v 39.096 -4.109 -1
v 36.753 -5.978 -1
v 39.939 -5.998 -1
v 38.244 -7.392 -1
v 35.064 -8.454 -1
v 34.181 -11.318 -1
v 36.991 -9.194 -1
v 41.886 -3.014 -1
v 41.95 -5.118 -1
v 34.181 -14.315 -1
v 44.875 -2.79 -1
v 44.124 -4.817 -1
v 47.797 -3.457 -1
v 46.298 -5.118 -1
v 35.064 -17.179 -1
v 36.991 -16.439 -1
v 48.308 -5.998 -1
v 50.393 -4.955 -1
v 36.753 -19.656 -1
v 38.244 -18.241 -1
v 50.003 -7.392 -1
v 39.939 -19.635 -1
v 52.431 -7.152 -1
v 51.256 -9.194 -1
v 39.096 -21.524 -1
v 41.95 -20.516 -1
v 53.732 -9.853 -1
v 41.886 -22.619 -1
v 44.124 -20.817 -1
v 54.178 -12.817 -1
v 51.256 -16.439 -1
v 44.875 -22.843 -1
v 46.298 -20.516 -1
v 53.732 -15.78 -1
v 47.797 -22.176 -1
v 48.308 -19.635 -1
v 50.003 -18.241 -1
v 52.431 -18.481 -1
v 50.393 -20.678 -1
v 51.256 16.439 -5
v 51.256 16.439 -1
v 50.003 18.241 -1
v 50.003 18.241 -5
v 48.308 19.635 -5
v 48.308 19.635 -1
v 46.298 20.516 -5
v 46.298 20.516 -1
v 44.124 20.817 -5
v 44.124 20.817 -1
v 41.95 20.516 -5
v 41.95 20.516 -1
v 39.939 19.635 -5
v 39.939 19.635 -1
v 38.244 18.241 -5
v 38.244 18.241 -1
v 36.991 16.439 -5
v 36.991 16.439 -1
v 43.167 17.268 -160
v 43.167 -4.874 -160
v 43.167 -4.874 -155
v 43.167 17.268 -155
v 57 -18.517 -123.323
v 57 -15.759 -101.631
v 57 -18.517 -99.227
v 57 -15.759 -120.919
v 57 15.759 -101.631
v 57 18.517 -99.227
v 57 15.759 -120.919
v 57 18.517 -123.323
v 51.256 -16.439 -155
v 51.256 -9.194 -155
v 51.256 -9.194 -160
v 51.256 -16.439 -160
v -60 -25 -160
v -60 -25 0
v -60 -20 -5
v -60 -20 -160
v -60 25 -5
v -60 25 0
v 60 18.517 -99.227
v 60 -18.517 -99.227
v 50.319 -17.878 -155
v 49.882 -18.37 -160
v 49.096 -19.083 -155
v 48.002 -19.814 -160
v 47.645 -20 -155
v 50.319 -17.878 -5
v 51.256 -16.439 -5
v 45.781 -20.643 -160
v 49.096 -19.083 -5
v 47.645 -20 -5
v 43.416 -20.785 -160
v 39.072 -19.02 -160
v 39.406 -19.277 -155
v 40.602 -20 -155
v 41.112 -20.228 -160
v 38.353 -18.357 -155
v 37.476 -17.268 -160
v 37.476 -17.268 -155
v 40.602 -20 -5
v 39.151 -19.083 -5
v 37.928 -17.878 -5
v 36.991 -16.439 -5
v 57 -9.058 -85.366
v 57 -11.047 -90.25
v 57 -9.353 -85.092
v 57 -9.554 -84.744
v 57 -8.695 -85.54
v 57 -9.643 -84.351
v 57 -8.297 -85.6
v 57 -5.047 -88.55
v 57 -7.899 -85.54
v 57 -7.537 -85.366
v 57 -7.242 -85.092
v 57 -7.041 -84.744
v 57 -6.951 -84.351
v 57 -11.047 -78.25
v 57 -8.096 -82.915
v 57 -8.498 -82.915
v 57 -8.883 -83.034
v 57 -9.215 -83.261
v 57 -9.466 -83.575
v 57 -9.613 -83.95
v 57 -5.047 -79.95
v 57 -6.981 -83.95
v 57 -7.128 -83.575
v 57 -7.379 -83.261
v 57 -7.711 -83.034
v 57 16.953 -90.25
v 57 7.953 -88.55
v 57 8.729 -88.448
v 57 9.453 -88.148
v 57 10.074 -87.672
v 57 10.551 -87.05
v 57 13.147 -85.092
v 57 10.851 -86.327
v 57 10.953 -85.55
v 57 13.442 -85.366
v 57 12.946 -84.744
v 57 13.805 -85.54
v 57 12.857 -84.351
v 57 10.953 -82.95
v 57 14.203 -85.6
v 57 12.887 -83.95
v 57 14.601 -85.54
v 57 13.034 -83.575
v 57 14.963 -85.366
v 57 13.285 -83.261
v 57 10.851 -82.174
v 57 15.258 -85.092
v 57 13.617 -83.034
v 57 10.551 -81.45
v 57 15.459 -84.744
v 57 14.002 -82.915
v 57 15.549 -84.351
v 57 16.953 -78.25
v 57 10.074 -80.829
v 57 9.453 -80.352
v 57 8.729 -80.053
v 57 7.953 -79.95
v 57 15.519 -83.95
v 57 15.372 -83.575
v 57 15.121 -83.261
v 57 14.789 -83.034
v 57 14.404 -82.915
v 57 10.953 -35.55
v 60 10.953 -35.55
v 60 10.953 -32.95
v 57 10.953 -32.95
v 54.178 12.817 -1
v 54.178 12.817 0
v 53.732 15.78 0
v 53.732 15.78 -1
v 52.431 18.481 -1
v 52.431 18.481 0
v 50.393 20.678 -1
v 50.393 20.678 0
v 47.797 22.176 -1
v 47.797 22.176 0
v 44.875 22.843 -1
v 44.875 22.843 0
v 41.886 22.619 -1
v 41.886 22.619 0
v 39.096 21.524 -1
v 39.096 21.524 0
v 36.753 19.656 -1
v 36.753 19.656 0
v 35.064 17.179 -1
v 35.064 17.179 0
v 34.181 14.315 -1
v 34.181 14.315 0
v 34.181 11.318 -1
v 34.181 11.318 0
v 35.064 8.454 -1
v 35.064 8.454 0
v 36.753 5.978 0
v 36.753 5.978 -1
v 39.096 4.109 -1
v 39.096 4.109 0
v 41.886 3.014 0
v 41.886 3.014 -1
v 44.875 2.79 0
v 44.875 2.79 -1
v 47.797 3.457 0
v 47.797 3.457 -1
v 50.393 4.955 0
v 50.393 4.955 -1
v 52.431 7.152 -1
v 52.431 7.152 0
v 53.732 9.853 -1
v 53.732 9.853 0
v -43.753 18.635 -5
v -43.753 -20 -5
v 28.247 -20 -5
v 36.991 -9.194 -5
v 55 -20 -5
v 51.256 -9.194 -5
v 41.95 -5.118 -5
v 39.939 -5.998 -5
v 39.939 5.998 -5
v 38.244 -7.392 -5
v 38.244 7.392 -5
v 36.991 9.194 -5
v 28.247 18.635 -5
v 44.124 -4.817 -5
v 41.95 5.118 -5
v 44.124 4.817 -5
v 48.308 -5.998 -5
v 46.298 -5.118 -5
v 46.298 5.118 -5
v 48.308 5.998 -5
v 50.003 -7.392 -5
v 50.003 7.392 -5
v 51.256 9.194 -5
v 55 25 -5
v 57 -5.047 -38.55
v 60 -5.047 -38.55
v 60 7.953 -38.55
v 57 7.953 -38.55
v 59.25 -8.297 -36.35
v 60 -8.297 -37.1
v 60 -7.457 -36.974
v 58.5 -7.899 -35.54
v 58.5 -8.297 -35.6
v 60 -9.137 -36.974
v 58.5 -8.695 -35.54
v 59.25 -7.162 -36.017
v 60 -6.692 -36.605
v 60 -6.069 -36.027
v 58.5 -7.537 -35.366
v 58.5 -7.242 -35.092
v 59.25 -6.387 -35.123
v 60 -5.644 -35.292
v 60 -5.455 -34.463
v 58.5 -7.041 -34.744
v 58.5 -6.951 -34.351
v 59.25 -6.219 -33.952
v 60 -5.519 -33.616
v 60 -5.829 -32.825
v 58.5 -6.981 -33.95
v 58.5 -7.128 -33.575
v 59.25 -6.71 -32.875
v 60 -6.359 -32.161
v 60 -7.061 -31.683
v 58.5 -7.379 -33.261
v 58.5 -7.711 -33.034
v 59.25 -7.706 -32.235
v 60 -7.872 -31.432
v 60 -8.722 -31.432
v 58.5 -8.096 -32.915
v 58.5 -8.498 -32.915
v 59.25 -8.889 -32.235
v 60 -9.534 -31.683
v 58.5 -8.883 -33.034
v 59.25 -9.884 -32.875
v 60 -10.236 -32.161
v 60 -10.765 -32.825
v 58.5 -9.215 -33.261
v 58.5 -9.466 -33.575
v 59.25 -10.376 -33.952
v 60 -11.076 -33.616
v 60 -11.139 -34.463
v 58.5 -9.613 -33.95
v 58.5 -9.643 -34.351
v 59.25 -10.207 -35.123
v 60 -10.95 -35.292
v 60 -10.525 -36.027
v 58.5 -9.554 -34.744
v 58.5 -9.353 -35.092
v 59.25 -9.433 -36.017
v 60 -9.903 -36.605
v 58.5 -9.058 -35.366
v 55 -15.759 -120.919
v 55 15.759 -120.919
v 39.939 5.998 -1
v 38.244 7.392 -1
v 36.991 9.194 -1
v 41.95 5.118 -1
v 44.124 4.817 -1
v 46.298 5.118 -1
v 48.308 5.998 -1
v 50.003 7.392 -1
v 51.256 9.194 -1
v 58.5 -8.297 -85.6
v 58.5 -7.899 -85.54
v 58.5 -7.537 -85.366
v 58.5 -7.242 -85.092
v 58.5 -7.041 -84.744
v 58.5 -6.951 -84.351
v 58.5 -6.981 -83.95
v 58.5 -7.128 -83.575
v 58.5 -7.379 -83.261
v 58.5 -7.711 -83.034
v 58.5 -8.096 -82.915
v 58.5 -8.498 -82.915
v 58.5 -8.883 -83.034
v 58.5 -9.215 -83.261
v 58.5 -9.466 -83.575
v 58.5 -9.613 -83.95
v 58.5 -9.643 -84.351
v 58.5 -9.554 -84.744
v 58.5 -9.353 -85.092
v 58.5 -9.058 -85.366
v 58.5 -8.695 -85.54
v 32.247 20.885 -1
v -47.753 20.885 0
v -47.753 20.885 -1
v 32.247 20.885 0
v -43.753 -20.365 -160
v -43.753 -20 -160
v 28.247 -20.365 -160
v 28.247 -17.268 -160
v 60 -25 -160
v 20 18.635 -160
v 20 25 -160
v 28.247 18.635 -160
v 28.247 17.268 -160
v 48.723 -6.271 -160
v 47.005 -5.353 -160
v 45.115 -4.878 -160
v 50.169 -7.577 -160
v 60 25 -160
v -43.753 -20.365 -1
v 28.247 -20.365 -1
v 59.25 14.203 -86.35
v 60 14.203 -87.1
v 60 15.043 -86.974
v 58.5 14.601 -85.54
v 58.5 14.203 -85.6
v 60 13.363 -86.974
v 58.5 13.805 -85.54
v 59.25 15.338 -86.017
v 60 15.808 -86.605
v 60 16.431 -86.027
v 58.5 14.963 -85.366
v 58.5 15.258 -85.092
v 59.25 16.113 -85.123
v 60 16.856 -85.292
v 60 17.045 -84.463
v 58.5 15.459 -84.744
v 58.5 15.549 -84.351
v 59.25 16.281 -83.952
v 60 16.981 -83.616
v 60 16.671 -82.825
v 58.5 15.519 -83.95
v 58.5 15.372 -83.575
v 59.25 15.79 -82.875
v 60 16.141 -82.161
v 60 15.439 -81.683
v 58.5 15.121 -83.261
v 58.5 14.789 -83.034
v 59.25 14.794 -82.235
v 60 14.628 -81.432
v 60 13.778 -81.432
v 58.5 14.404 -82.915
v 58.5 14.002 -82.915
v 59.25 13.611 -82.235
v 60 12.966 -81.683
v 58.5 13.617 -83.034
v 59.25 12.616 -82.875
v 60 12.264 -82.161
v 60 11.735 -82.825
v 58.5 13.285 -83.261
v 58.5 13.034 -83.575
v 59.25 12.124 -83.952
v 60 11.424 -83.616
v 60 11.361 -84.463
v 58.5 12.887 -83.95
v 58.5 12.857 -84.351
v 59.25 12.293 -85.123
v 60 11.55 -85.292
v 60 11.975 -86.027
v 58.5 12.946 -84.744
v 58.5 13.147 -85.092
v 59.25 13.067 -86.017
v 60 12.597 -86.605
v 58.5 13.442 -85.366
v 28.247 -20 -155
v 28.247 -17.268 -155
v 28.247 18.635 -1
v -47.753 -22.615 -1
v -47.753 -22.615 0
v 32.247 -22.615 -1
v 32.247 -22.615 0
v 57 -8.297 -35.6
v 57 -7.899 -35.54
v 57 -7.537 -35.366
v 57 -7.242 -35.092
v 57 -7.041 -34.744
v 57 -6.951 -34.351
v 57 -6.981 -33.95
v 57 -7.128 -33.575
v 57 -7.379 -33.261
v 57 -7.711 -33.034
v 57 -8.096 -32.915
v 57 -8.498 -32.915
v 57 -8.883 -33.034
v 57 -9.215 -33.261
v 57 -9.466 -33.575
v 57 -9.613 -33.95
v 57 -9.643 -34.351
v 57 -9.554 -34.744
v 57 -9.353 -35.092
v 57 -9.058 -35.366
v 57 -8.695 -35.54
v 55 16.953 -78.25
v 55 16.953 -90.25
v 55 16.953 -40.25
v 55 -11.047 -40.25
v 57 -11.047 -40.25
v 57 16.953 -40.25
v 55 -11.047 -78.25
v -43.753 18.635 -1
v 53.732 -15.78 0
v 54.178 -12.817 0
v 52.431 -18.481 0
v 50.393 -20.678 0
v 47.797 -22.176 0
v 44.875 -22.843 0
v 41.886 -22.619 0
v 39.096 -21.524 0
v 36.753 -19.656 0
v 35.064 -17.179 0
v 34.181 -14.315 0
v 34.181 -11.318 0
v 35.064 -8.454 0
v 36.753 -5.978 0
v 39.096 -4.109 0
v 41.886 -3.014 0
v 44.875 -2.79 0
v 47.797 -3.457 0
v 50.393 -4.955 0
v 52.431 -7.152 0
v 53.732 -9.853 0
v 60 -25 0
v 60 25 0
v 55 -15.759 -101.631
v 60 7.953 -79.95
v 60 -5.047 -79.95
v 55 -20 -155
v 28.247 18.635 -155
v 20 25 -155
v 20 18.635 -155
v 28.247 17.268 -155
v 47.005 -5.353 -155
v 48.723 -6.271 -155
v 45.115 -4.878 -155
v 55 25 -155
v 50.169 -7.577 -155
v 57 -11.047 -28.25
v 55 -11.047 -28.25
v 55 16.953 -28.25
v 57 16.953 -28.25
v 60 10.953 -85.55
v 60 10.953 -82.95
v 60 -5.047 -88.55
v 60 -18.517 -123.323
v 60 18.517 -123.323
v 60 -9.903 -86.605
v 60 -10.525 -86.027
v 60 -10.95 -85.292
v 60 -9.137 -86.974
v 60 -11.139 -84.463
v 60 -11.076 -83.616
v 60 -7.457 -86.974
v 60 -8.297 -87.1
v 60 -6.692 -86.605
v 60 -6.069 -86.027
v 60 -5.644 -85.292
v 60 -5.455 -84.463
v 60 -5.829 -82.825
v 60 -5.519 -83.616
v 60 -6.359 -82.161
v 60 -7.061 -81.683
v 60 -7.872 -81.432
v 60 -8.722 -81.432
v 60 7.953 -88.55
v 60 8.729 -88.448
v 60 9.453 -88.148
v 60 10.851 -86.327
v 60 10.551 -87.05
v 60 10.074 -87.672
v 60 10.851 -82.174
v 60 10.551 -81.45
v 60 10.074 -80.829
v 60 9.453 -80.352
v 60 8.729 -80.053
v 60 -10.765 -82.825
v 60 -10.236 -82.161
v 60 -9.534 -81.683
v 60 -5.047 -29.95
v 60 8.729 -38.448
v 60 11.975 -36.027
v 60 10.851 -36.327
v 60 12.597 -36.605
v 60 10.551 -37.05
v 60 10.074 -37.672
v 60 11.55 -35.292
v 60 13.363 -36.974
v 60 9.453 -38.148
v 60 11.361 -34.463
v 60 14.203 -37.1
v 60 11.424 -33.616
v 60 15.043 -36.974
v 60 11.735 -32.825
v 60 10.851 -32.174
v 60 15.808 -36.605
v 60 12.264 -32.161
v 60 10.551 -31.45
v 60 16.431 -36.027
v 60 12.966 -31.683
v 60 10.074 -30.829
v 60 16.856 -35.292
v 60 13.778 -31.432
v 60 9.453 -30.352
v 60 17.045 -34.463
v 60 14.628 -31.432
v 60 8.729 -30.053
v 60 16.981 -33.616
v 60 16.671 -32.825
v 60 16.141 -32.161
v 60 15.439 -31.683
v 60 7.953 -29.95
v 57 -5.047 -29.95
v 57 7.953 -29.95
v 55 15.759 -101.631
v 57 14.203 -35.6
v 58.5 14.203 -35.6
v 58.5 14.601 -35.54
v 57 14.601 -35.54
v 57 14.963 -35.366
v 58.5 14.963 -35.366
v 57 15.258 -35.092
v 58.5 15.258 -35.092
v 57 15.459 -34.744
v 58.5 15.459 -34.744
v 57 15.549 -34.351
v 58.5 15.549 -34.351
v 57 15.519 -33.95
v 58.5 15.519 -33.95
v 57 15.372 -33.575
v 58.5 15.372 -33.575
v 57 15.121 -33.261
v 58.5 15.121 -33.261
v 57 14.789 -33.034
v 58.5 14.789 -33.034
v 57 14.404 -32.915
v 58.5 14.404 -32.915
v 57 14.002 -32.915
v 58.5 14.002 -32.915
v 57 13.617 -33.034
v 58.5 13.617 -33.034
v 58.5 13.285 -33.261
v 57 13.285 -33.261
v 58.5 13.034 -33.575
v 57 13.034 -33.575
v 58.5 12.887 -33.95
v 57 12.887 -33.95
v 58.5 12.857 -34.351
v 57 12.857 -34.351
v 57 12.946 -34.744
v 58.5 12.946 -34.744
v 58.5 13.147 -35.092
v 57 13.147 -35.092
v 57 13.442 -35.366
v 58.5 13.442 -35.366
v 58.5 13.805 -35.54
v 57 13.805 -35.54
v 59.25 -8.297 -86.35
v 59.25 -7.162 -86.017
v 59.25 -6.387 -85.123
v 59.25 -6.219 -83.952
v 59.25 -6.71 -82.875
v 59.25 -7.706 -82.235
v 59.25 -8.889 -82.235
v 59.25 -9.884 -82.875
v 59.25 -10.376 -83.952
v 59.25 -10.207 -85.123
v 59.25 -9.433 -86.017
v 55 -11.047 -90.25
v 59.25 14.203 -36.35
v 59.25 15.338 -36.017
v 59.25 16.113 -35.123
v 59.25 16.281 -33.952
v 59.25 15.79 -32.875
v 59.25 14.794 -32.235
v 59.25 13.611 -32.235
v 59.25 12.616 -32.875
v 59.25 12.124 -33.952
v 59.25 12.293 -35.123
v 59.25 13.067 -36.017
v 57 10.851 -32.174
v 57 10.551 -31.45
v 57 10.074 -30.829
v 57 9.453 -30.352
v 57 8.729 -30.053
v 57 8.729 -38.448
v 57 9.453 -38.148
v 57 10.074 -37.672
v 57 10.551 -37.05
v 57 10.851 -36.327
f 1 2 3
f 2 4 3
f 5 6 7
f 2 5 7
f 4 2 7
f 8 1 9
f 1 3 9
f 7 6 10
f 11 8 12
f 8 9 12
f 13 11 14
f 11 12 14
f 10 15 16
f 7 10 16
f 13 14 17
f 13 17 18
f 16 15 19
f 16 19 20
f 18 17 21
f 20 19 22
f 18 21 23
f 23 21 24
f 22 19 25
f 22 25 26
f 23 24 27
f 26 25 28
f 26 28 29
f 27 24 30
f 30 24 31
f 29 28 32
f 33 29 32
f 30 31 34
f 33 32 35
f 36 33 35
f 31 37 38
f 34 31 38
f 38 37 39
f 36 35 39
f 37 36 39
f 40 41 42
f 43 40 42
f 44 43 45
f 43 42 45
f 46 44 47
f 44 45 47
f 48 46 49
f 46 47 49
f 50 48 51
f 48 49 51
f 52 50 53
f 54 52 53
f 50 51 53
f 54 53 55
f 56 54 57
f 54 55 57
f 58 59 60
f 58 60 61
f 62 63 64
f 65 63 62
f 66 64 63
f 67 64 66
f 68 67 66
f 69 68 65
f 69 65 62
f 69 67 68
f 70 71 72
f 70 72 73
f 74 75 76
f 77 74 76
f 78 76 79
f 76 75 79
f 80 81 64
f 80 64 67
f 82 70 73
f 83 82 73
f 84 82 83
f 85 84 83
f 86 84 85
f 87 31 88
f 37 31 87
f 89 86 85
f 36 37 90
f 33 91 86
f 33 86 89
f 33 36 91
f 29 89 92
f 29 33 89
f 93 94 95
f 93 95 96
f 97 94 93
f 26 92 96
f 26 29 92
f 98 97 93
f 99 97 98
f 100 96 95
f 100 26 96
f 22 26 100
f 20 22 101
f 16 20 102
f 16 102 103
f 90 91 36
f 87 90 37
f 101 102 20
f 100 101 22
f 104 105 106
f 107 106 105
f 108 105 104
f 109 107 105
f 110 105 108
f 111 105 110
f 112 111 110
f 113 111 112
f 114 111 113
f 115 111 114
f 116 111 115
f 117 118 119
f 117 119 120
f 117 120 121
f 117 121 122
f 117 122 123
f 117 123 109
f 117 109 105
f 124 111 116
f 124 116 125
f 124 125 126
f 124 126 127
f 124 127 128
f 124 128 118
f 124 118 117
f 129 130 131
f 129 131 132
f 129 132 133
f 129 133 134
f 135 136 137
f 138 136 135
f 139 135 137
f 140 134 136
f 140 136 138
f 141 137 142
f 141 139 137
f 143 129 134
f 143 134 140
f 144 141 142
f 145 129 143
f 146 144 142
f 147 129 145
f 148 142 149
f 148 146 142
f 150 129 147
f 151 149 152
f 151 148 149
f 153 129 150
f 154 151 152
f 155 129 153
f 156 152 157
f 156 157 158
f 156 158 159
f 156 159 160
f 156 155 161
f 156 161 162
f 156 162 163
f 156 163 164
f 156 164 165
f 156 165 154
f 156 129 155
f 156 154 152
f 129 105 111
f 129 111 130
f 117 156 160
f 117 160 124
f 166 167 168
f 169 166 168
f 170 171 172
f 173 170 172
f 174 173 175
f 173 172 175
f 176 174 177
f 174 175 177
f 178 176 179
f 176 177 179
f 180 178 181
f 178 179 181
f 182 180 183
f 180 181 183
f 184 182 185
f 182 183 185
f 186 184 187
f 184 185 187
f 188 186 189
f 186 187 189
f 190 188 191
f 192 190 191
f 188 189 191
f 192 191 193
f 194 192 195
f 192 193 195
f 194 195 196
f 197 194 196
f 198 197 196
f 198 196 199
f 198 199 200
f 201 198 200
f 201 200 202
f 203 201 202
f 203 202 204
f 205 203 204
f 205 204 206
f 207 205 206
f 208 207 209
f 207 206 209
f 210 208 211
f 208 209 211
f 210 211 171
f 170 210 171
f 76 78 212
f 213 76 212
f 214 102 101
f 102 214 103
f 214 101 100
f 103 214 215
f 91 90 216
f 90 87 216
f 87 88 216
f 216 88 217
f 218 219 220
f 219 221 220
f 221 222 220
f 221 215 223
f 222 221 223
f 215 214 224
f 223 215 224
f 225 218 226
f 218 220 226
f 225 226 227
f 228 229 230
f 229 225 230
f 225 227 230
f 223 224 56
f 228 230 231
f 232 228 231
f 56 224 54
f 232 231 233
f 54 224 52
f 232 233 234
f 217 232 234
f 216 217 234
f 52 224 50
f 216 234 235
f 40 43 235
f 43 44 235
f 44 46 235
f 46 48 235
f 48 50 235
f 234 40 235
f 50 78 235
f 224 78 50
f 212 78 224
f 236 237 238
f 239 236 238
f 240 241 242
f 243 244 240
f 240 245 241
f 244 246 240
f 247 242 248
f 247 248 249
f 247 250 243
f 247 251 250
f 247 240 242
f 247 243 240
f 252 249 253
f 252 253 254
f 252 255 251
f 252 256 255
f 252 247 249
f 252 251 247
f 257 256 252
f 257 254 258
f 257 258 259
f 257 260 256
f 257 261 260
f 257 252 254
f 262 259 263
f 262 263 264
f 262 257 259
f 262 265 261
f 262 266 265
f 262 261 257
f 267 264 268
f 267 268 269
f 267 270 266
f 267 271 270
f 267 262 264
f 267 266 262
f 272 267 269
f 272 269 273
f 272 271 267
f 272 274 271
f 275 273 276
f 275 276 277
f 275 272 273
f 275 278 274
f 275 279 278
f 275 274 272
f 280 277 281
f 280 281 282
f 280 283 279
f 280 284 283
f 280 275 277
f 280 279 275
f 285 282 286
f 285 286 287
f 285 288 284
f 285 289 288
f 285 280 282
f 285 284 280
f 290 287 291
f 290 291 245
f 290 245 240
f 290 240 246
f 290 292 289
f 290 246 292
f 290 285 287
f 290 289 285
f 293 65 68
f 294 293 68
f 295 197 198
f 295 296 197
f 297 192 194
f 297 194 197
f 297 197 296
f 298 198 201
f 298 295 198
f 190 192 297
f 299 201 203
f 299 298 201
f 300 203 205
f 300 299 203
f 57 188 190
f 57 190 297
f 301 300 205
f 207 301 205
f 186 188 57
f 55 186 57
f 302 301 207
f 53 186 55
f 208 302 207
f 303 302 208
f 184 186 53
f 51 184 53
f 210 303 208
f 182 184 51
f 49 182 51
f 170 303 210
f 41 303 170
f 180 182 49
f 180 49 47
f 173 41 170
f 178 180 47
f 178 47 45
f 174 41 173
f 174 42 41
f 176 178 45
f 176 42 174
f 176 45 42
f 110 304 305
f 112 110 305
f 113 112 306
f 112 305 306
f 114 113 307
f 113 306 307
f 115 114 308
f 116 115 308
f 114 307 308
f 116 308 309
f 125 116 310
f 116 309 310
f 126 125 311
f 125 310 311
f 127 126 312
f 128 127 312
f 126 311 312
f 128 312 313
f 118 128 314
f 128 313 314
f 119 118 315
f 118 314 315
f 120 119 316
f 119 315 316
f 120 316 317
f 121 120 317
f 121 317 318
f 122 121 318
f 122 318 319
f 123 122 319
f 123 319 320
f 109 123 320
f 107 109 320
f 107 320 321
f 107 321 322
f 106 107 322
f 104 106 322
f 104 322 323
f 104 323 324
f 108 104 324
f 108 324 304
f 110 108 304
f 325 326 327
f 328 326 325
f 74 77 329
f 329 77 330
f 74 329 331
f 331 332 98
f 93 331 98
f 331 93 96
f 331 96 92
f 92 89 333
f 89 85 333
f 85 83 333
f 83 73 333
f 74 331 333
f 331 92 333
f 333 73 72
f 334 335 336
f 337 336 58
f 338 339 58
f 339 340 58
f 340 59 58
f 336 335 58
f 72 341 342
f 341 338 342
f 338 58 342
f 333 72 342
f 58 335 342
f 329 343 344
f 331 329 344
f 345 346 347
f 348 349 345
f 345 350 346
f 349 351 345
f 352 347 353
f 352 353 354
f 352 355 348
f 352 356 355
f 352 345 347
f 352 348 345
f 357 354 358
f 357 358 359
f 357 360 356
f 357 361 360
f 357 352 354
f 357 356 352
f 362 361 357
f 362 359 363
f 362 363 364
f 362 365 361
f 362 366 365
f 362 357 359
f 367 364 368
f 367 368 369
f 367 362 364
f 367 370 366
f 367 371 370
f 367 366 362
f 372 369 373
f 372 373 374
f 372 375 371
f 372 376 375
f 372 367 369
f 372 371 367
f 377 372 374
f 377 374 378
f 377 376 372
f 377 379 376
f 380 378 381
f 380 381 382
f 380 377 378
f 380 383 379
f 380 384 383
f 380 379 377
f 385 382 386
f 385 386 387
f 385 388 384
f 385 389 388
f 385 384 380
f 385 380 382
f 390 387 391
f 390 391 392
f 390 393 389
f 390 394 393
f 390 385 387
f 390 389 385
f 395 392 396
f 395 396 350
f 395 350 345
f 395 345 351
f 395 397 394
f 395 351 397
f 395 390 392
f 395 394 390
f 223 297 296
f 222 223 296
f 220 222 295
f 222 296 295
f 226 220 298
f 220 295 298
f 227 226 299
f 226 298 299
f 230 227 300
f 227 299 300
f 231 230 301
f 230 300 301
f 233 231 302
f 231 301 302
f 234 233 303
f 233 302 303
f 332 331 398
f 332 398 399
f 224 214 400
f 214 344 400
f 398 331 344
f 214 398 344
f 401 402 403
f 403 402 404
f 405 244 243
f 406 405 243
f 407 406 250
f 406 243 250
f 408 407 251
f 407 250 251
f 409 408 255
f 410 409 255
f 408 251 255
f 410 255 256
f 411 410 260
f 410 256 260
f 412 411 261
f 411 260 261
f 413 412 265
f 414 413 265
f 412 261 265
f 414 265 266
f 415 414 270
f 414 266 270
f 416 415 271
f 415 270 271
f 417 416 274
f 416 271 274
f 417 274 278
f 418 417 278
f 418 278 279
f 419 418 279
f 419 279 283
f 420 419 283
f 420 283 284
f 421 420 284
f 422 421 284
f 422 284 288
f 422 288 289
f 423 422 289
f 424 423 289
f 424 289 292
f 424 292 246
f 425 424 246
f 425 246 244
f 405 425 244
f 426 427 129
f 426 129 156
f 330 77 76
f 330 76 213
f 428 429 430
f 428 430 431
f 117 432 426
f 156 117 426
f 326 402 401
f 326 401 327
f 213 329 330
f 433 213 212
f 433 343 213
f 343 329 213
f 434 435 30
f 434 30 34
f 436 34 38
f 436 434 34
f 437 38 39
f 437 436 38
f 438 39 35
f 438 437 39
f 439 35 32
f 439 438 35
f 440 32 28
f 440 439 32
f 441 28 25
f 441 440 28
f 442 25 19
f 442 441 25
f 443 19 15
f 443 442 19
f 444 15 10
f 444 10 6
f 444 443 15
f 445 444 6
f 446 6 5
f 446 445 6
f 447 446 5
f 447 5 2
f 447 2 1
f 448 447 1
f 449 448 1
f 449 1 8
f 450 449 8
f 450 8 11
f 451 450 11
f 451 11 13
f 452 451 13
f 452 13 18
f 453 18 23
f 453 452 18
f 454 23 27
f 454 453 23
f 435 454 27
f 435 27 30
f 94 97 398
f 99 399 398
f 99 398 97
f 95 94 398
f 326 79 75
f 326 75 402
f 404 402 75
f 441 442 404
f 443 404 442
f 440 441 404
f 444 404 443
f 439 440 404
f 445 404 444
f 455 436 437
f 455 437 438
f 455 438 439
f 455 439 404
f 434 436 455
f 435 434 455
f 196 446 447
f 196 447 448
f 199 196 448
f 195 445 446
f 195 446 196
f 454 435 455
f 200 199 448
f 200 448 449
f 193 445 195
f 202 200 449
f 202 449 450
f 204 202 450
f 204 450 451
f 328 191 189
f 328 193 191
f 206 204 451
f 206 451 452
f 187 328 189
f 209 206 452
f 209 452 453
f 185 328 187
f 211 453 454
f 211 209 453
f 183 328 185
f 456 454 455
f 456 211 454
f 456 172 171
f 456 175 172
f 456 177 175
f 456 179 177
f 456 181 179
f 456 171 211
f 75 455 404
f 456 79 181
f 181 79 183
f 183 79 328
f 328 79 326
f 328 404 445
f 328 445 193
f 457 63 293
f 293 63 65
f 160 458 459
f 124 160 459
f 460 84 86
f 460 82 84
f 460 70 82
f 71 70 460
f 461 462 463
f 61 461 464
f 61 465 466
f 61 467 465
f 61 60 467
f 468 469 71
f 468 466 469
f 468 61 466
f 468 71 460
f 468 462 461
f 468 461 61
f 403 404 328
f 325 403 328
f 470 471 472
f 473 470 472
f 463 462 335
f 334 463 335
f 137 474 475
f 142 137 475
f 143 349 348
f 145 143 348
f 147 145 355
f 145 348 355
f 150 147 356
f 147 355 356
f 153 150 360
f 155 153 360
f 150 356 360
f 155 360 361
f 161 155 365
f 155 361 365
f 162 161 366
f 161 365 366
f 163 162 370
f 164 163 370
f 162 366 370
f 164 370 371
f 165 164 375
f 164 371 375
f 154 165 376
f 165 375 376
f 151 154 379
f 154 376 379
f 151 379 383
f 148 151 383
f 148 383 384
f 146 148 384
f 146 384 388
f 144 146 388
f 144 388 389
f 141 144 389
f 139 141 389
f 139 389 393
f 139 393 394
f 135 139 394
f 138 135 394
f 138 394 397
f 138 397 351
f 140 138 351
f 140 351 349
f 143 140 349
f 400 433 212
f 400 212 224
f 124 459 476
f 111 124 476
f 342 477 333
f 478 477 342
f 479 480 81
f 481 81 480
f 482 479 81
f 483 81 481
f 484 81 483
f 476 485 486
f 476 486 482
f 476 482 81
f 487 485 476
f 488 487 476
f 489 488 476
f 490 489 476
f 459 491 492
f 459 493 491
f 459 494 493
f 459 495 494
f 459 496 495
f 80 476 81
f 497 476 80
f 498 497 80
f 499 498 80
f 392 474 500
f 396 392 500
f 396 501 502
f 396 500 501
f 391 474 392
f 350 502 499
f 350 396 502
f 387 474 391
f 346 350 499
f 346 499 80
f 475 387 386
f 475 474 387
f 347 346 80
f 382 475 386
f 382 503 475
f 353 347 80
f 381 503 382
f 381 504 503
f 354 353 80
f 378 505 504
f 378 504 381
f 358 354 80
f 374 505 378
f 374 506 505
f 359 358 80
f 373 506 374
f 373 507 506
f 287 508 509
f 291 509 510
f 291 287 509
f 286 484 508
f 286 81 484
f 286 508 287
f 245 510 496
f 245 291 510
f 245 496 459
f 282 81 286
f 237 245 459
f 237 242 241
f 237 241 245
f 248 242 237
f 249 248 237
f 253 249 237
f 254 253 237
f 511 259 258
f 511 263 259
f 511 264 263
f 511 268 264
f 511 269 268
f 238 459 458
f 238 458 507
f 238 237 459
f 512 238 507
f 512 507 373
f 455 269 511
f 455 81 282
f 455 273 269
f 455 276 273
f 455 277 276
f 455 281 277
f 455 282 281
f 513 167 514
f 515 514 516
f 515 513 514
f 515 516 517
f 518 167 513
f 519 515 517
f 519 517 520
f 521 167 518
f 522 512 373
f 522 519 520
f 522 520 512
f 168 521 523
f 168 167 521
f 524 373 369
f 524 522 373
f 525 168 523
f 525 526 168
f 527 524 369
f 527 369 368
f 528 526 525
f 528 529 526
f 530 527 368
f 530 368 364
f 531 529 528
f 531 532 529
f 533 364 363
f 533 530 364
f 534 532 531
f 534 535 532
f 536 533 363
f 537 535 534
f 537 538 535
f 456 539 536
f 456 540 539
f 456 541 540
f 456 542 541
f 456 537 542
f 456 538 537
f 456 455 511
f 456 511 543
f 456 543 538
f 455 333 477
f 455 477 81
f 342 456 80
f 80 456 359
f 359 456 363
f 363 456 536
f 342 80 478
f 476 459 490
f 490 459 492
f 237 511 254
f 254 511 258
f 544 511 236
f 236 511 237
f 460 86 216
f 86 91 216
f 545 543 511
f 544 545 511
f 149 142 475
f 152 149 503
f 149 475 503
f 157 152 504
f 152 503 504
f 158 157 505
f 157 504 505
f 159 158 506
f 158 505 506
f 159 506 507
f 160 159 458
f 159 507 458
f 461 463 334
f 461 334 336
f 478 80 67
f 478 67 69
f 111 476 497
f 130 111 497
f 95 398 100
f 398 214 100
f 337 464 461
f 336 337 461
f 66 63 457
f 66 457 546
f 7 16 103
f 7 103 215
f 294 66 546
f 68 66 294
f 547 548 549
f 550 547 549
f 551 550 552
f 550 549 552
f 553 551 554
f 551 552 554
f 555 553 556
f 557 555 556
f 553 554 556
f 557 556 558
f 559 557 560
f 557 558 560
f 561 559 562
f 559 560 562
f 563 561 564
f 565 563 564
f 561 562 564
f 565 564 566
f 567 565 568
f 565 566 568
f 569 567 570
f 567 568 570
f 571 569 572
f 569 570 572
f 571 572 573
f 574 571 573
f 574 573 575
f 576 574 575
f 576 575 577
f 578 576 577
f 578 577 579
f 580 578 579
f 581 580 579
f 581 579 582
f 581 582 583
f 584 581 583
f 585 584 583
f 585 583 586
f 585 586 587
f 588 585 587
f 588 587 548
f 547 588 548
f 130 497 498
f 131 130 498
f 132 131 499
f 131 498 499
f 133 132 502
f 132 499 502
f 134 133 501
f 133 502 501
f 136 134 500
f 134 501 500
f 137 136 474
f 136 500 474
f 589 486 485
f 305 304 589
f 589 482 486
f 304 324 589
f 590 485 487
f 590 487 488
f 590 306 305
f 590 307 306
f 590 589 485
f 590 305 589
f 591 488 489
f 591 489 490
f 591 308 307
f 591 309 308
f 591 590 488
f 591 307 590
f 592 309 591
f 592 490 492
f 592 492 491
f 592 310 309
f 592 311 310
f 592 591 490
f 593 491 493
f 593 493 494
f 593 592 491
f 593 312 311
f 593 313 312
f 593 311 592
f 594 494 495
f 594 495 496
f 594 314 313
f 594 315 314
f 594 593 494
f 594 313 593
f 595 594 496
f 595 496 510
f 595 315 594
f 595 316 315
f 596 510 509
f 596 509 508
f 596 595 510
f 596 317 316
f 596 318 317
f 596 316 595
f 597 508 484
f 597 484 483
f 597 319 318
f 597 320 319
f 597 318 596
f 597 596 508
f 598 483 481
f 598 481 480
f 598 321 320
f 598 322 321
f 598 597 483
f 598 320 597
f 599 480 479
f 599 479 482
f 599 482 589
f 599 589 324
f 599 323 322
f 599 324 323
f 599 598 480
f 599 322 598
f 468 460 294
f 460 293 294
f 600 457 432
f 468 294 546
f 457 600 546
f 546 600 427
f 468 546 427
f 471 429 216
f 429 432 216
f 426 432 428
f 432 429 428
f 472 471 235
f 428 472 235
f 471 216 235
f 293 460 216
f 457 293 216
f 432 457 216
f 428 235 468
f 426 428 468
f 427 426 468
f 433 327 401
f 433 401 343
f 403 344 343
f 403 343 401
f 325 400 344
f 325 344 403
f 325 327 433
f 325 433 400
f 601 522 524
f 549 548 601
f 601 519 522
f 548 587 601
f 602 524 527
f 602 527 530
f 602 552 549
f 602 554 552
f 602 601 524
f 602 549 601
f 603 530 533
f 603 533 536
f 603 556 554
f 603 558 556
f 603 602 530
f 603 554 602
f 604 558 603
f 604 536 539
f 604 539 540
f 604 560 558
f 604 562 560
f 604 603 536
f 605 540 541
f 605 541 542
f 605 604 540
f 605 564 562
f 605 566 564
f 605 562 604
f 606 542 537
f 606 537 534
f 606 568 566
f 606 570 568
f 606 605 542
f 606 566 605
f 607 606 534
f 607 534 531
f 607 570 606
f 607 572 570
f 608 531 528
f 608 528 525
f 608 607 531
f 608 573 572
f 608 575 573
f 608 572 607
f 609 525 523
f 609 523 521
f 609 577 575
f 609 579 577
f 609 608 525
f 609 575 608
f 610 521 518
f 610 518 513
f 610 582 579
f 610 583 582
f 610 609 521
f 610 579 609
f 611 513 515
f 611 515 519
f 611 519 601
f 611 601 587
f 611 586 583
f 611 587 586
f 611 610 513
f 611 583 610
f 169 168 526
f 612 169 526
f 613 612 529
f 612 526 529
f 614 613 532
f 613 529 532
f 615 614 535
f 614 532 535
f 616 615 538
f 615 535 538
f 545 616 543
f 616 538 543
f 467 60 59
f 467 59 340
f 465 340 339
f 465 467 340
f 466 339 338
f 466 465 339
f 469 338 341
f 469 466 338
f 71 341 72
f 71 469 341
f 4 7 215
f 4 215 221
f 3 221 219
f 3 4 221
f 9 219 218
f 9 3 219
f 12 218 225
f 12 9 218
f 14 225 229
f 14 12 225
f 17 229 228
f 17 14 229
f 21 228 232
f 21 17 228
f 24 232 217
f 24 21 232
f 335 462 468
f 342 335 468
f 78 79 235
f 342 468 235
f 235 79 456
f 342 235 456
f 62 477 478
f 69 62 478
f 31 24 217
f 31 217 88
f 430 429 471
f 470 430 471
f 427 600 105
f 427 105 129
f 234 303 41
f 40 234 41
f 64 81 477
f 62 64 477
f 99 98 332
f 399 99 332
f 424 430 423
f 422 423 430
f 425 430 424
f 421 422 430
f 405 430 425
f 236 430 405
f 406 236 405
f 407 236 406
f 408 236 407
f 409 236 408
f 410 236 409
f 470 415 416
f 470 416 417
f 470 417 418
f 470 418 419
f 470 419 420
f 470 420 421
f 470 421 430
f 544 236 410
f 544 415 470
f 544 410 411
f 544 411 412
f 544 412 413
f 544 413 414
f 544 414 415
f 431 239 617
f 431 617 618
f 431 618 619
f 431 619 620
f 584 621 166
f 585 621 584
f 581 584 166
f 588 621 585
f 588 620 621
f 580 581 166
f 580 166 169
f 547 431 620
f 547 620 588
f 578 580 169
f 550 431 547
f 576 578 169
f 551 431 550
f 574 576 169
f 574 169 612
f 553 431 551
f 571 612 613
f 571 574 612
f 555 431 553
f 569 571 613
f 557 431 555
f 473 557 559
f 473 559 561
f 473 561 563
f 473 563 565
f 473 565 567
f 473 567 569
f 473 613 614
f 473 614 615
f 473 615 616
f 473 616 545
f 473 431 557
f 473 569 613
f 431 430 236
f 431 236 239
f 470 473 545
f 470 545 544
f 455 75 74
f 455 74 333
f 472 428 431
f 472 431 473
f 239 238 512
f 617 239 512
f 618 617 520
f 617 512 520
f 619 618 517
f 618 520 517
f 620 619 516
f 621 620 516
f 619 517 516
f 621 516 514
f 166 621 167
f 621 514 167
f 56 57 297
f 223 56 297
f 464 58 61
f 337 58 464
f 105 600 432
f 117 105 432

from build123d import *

# Parameters (mm, degrees)
SKETCH1_W                  = 120
SKETCH1_H                  = 50
BOSS_EXTRUDE1_DEPTH        = 160
SHELL1_T                   = -5
CUT_EXTRUDE2_REACH         = 174.699
SKETCH4_W                  = 72
SKETCH4_H                  = 39
SKETCH5_W                  = 80
SKETCH5_H                  = 43.5
CUT_EXTRUDE3_DEPTH         = 1
CUT_EXTRUDE4_REACH         = 174.699
SKETCH7_R                  = 10.054878977
CUT_EXTRUDE5_DEPTH         = 1
CUT_EXTRUDE6_REACH         = 203.556
SKETCH9_R                  = 1.35
CHAMFER1_SIZE              = 1.5
SKETCH10_W                 = 12
SKETCH10_H                 = 28
CUT_EXTRUDE7_DEPTH         = 2
LPATTERN1_COUNT            = 2
LPATTERN1_PITCH            = 50
CHAMFER1_OF_LPATTERN1_SIZE = 1.5
SKETCH11_W                 = 19.287715199
SKETCH11_H                 = 31.517777442
CUT_EXTRUDE8_DEPTH         = 202.556443707
SKETCH12_W                 = 24.096142941
SKETCH12_H                 = 37.033540034
CUT_EXTRUDE9_DEPTH         = 3
CUT_EXTRUDE10_REACH        = 174.699
SKETCH13_W                 = 24.602100194
SKETCH13_H                 = 34.536068778
SKETCH2_W                  = 80
SKETCH2_H                  = 57.520884572
CUT_EXTRUDE1_DEPTH         = 177.705970471


with BuildPart() as part:
    # Sketch1 → Boss-Extrude1 (new body)
    with BuildSketch(Plane.XY):
        Rectangle(SKETCH1_W, SKETCH1_H)
    extrude(amount=-BOSS_EXTRUDE1_DEPTH)

    # Shell1
    shell1_openings = [part.faces().sort_by_distance(p)[0] for p in [
        (-60, 0, -80),
        (0, 25, -80),
    ]]
    offset(amount=SHELL1_T, openings=shell1_openings, kind=Kind.INTERSECTION)

    # Sketch4 → Cut-Extrude2 (cut, up to next)
    with BuildSketch(Plane.XY, mode=Mode.PRIVATE) as cut_extrude2_sk1:
        with Locations((-7.752822836, -0.864806595)):
            Rectangle(SKETCH4_W, SKETCH4_H)
    cut_extrude2_tool1 = extrude(cut_extrude2_sk1.sketch, amount=-CUT_EXTRUDE2_REACH, mode=Mode.PRIVATE) & part.part
    add(cut_extrude2_tool1.solids().sort_by_distance((-7.752823, -0.864807, 0))[0], mode=Mode.SUBTRACT)

    # Sketch5 → Cut-Extrude3 (cut)
    with BuildSketch(Plane.XY):
        with Locations((-7.752822836, -0.864806595)):
            Rectangle(SKETCH5_W, SKETCH5_H)
    extrude(amount=-CUT_EXTRUDE3_DEPTH, mode=Mode.SUBTRACT)

    # Sketch6 → Cut-Extrude4 (cut, up to next)
    with BuildSketch(Plane.XY, mode=Mode.PRIVATE) as cut_extrude4_sk1:
        with BuildLine():
            Line((51.25624878, 9.193705725), (51.25624878, 16.439437846))
            ThreePointArc((51.25624878, 16.439437846), (44.123588582, 20.816571785), (36.990928383, 16.439437846))
            Line((36.990928383, 16.439437846), (36.990928383, 9.193705725))
            ThreePointArc((36.990928383, 9.193705725), (44.123588582, 4.816571785), (51.25624878, 9.193705725))
        make_face()
    cut_extrude4_tool1 = extrude(cut_extrude4_sk1.sketch, amount=-CUT_EXTRUDE4_REACH, mode=Mode.PRIVATE) & part.part
    cut_extrude4 = cut_extrude4_tool1.solids().sort_by_distance((44.123589, 12.816572, 0))[0]
    add(cut_extrude4, mode=Mode.SUBTRACT)

    # Sketch7 → Cut-Extrude5 (cut)
    with BuildSketch(Plane.XY):
        with Locations((44.123588582, 12.816571785)):
            Circle(SKETCH7_R)
    cut_extrude5 = extrude(amount=-CUT_EXTRUDE5_DEPTH, mode=Mode.SUBTRACT)

    # Mirror1: Cut-Extrude4, Cut-Extrude5 mirrored; each copy of Cut-Extrude4 runs up to whatever stops it at its own place
    mirror1_before = part.part  # the part as the pattern finds it: every copy runs up to it
    mirror1_cut_extrude4_long = extrude(cut_extrude4_sk1.sketch, amount=-CUT_EXTRUDE4_REACH, mode=Mode.PRIVATE)
    mirror1_cut_extrude4_tool = mirror1_cut_extrude4_long.mirror(Plane.ZX) & mirror1_before
    add(mirror1_cut_extrude4_tool.solids().sort_by_distance((44.123589, -12.816572, 0))[0], mode=Mode.SUBTRACT)
    add(cut_extrude5.mirror(Plane.ZX), mode=Mode.SUBTRACT)

    # Sketch9 → Cut-Extrude6 (cut, up to next)
    with BuildSketch(Plane(origin=(60, 0, 0), x_dir=(0, 0, -1), z_dir=(1, 0, 0)), mode=Mode.PRIVATE) as cut_extrude6_sk1:
        with Locations((34.250404533, 14.202757041)):
            Circle(SKETCH9_R)
    cut_extrude6_tool1 = extrude(cut_extrude6_sk1.sketch, amount=-CUT_EXTRUDE6_REACH, mode=Mode.PRIVATE) & part.part
    # Sketch9 → Cut-Extrude6 (cut, up to next)
    with BuildSketch(Plane(origin=(60, 0, 0), x_dir=(0, 0, -1), z_dir=(1, 0, 0)), mode=Mode.PRIVATE) as cut_extrude6_sk2:
        with Locations((34.250404533, -8.297242959)):
            Circle(SKETCH9_R)
    cut_extrude6_tool2 = extrude(cut_extrude6_sk2.sketch, amount=-CUT_EXTRUDE6_REACH, mode=Mode.PRIVATE) & part.part
    # Sketch9 → Cut-Extrude6 (cut, up to next)
    with BuildSketch(Plane(origin=(60, 0, 0), x_dir=(0, 0, -1), z_dir=(1, 0, 0)), mode=Mode.PRIVATE) as cut_extrude6_sk3:
        with BuildLine():
            Line((29.950404533, -5.047242959), (38.550404533, -5.047242959))
            Line((38.550404533, -5.047242959), (38.550404533, 7.952757041))
            ThreePointArc((38.550404533, 7.952757041), (37.671724876, 10.074077384), (35.550404533, 10.952757041))
            Line((35.550404533, 10.952757041), (32.950404533, 10.952757041))
            ThreePointArc((32.950404533, 10.952757041), (30.829084189, 10.074077384), (29.950404533, 7.952757041))
            Line((29.950404533, 7.952757041), (29.950404533, -5.047242959))
        make_face()
    cut_extrude6_tool3 = extrude(cut_extrude6_sk3.sketch, amount=-CUT_EXTRUDE6_REACH, mode=Mode.PRIVATE) & part.part
    cut_extrude6_1 = cut_extrude6_tool1.solids().sort_by_distance((60, 14.202757, -34.250405))[0]
    add(cut_extrude6_1, mode=Mode.SUBTRACT)
    cut_extrude6_2 = cut_extrude6_tool2.solids().sort_by_distance((60, -8.297243, -34.250405))[0]
    add(cut_extrude6_2, mode=Mode.SUBTRACT)
    cut_extrude6_3 = cut_extrude6_tool3.solids().sort_by_distance((60, 2.741042, -34.250405))[0]
    add(cut_extrude6_3, mode=Mode.SUBTRACT)
    cut_extrude6 = cut_extrude6_1 + cut_extrude6_2 + cut_extrude6_3  # Cut-Extrude6 as one shape, for the pattern or mirror that repeats it

    # Chamfer1
    chamfer1_edges = [part.edges().sort_by_distance(p)[0] for p in [
        (60, -8.297242959, -32.900404533),
        (60, 14.202757041, -32.900404533),
    ]]
    chamfer(chamfer1_edges, length=CHAMFER1_SIZE)

    # Sketch10 → Cut-Extrude7 (cut)
    with BuildSketch(Plane.ZY.offset(-55)):
        with Locations((-34.250404533, 2.952757041)):
            Rectangle(SKETCH10_W, SKETCH10_H)
    cut_extrude7 = extrude(amount=-CUT_EXTRUDE7_DEPTH, mode=Mode.SUBTRACT)

    # LPattern1: Cut-Extrude6, Cut-Extrude7 ×2
    with Locations(*[(0, 0, -i * LPATTERN1_PITCH) for i in range(1, LPATTERN1_COUNT)]):
        add(cut_extrude6, mode=Mode.SUBTRACT)
        add(cut_extrude7, mode=Mode.SUBTRACT)

    # Chamfer1 of LPattern1
    chamfer1_of_lpattern1_edges = [part.edges().sort_by_distance(p)[0] for p in [
        (60, -8.297242959, -82.900404533),
        (60, 14.202757041, -82.900404533),
    ]]
    chamfer(chamfer1_of_lpattern1_edges, length=CHAMFER1_OF_LPATTERN1_SIZE)

    # Sketch11 → Cut-Extrude8 (cut, through all)
    with BuildSketch(Plane(origin=(60, 0, 0), x_dir=(0, 0, -1), z_dir=(1, 0, 0))):
        with Locations((111.274658912, 0)):
            Rectangle(SKETCH11_W, SKETCH11_H)
    extrude(amount=-CUT_EXTRUDE8_DEPTH, mode=Mode.SUBTRACT)

    # Sketch12 → Cut-Extrude9 (cut)
    with BuildSketch(Plane(origin=(60, 0, 0), x_dir=(0, 0, -1), z_dir=(1, 0, 0))):
        with Locations((111.274658912, 0)):
            Rectangle(SKETCH12_W, SKETCH12_H)
    extrude(amount=-CUT_EXTRUDE9_DEPTH, mode=Mode.SUBTRACT)

    # Sketch13 → Cut-Extrude10 (cut, up to next)
    with BuildSketch(Plane(origin=(0, 0, -160), x_dir=(-1, 0, 0), z_dir=(0, 0, -1)), mode=Mode.PRIVATE) as cut_extrude10_sk1:
        with Locations((-30.86599902, 0)):
            Rectangle(SKETCH13_W, SKETCH13_H)
    cut_extrude10_tool1 = extrude(cut_extrude10_sk1.sketch, amount=-CUT_EXTRUDE10_REACH, mode=Mode.PRIVATE) & part.part
    add(cut_extrude10_tool1.solids().sort_by_distance((30.865999, 0, -160))[0], mode=Mode.SUBTRACT)

    # Sketch2 → Cut-Extrude1 (cut, through all)
    with BuildSketch(Plane(origin=(0, -20, 0), x_dir=(1, 0, 0), z_dir=(0, 1, 0))):
        with Locations((-20, 183.760442286)):
            Rectangle(SKETCH2_W, SKETCH2_H)
    extrude(amount=CUT_EXTRUDE1_DEPTH, mode=Mode.SUBTRACT)


solid = part.part
